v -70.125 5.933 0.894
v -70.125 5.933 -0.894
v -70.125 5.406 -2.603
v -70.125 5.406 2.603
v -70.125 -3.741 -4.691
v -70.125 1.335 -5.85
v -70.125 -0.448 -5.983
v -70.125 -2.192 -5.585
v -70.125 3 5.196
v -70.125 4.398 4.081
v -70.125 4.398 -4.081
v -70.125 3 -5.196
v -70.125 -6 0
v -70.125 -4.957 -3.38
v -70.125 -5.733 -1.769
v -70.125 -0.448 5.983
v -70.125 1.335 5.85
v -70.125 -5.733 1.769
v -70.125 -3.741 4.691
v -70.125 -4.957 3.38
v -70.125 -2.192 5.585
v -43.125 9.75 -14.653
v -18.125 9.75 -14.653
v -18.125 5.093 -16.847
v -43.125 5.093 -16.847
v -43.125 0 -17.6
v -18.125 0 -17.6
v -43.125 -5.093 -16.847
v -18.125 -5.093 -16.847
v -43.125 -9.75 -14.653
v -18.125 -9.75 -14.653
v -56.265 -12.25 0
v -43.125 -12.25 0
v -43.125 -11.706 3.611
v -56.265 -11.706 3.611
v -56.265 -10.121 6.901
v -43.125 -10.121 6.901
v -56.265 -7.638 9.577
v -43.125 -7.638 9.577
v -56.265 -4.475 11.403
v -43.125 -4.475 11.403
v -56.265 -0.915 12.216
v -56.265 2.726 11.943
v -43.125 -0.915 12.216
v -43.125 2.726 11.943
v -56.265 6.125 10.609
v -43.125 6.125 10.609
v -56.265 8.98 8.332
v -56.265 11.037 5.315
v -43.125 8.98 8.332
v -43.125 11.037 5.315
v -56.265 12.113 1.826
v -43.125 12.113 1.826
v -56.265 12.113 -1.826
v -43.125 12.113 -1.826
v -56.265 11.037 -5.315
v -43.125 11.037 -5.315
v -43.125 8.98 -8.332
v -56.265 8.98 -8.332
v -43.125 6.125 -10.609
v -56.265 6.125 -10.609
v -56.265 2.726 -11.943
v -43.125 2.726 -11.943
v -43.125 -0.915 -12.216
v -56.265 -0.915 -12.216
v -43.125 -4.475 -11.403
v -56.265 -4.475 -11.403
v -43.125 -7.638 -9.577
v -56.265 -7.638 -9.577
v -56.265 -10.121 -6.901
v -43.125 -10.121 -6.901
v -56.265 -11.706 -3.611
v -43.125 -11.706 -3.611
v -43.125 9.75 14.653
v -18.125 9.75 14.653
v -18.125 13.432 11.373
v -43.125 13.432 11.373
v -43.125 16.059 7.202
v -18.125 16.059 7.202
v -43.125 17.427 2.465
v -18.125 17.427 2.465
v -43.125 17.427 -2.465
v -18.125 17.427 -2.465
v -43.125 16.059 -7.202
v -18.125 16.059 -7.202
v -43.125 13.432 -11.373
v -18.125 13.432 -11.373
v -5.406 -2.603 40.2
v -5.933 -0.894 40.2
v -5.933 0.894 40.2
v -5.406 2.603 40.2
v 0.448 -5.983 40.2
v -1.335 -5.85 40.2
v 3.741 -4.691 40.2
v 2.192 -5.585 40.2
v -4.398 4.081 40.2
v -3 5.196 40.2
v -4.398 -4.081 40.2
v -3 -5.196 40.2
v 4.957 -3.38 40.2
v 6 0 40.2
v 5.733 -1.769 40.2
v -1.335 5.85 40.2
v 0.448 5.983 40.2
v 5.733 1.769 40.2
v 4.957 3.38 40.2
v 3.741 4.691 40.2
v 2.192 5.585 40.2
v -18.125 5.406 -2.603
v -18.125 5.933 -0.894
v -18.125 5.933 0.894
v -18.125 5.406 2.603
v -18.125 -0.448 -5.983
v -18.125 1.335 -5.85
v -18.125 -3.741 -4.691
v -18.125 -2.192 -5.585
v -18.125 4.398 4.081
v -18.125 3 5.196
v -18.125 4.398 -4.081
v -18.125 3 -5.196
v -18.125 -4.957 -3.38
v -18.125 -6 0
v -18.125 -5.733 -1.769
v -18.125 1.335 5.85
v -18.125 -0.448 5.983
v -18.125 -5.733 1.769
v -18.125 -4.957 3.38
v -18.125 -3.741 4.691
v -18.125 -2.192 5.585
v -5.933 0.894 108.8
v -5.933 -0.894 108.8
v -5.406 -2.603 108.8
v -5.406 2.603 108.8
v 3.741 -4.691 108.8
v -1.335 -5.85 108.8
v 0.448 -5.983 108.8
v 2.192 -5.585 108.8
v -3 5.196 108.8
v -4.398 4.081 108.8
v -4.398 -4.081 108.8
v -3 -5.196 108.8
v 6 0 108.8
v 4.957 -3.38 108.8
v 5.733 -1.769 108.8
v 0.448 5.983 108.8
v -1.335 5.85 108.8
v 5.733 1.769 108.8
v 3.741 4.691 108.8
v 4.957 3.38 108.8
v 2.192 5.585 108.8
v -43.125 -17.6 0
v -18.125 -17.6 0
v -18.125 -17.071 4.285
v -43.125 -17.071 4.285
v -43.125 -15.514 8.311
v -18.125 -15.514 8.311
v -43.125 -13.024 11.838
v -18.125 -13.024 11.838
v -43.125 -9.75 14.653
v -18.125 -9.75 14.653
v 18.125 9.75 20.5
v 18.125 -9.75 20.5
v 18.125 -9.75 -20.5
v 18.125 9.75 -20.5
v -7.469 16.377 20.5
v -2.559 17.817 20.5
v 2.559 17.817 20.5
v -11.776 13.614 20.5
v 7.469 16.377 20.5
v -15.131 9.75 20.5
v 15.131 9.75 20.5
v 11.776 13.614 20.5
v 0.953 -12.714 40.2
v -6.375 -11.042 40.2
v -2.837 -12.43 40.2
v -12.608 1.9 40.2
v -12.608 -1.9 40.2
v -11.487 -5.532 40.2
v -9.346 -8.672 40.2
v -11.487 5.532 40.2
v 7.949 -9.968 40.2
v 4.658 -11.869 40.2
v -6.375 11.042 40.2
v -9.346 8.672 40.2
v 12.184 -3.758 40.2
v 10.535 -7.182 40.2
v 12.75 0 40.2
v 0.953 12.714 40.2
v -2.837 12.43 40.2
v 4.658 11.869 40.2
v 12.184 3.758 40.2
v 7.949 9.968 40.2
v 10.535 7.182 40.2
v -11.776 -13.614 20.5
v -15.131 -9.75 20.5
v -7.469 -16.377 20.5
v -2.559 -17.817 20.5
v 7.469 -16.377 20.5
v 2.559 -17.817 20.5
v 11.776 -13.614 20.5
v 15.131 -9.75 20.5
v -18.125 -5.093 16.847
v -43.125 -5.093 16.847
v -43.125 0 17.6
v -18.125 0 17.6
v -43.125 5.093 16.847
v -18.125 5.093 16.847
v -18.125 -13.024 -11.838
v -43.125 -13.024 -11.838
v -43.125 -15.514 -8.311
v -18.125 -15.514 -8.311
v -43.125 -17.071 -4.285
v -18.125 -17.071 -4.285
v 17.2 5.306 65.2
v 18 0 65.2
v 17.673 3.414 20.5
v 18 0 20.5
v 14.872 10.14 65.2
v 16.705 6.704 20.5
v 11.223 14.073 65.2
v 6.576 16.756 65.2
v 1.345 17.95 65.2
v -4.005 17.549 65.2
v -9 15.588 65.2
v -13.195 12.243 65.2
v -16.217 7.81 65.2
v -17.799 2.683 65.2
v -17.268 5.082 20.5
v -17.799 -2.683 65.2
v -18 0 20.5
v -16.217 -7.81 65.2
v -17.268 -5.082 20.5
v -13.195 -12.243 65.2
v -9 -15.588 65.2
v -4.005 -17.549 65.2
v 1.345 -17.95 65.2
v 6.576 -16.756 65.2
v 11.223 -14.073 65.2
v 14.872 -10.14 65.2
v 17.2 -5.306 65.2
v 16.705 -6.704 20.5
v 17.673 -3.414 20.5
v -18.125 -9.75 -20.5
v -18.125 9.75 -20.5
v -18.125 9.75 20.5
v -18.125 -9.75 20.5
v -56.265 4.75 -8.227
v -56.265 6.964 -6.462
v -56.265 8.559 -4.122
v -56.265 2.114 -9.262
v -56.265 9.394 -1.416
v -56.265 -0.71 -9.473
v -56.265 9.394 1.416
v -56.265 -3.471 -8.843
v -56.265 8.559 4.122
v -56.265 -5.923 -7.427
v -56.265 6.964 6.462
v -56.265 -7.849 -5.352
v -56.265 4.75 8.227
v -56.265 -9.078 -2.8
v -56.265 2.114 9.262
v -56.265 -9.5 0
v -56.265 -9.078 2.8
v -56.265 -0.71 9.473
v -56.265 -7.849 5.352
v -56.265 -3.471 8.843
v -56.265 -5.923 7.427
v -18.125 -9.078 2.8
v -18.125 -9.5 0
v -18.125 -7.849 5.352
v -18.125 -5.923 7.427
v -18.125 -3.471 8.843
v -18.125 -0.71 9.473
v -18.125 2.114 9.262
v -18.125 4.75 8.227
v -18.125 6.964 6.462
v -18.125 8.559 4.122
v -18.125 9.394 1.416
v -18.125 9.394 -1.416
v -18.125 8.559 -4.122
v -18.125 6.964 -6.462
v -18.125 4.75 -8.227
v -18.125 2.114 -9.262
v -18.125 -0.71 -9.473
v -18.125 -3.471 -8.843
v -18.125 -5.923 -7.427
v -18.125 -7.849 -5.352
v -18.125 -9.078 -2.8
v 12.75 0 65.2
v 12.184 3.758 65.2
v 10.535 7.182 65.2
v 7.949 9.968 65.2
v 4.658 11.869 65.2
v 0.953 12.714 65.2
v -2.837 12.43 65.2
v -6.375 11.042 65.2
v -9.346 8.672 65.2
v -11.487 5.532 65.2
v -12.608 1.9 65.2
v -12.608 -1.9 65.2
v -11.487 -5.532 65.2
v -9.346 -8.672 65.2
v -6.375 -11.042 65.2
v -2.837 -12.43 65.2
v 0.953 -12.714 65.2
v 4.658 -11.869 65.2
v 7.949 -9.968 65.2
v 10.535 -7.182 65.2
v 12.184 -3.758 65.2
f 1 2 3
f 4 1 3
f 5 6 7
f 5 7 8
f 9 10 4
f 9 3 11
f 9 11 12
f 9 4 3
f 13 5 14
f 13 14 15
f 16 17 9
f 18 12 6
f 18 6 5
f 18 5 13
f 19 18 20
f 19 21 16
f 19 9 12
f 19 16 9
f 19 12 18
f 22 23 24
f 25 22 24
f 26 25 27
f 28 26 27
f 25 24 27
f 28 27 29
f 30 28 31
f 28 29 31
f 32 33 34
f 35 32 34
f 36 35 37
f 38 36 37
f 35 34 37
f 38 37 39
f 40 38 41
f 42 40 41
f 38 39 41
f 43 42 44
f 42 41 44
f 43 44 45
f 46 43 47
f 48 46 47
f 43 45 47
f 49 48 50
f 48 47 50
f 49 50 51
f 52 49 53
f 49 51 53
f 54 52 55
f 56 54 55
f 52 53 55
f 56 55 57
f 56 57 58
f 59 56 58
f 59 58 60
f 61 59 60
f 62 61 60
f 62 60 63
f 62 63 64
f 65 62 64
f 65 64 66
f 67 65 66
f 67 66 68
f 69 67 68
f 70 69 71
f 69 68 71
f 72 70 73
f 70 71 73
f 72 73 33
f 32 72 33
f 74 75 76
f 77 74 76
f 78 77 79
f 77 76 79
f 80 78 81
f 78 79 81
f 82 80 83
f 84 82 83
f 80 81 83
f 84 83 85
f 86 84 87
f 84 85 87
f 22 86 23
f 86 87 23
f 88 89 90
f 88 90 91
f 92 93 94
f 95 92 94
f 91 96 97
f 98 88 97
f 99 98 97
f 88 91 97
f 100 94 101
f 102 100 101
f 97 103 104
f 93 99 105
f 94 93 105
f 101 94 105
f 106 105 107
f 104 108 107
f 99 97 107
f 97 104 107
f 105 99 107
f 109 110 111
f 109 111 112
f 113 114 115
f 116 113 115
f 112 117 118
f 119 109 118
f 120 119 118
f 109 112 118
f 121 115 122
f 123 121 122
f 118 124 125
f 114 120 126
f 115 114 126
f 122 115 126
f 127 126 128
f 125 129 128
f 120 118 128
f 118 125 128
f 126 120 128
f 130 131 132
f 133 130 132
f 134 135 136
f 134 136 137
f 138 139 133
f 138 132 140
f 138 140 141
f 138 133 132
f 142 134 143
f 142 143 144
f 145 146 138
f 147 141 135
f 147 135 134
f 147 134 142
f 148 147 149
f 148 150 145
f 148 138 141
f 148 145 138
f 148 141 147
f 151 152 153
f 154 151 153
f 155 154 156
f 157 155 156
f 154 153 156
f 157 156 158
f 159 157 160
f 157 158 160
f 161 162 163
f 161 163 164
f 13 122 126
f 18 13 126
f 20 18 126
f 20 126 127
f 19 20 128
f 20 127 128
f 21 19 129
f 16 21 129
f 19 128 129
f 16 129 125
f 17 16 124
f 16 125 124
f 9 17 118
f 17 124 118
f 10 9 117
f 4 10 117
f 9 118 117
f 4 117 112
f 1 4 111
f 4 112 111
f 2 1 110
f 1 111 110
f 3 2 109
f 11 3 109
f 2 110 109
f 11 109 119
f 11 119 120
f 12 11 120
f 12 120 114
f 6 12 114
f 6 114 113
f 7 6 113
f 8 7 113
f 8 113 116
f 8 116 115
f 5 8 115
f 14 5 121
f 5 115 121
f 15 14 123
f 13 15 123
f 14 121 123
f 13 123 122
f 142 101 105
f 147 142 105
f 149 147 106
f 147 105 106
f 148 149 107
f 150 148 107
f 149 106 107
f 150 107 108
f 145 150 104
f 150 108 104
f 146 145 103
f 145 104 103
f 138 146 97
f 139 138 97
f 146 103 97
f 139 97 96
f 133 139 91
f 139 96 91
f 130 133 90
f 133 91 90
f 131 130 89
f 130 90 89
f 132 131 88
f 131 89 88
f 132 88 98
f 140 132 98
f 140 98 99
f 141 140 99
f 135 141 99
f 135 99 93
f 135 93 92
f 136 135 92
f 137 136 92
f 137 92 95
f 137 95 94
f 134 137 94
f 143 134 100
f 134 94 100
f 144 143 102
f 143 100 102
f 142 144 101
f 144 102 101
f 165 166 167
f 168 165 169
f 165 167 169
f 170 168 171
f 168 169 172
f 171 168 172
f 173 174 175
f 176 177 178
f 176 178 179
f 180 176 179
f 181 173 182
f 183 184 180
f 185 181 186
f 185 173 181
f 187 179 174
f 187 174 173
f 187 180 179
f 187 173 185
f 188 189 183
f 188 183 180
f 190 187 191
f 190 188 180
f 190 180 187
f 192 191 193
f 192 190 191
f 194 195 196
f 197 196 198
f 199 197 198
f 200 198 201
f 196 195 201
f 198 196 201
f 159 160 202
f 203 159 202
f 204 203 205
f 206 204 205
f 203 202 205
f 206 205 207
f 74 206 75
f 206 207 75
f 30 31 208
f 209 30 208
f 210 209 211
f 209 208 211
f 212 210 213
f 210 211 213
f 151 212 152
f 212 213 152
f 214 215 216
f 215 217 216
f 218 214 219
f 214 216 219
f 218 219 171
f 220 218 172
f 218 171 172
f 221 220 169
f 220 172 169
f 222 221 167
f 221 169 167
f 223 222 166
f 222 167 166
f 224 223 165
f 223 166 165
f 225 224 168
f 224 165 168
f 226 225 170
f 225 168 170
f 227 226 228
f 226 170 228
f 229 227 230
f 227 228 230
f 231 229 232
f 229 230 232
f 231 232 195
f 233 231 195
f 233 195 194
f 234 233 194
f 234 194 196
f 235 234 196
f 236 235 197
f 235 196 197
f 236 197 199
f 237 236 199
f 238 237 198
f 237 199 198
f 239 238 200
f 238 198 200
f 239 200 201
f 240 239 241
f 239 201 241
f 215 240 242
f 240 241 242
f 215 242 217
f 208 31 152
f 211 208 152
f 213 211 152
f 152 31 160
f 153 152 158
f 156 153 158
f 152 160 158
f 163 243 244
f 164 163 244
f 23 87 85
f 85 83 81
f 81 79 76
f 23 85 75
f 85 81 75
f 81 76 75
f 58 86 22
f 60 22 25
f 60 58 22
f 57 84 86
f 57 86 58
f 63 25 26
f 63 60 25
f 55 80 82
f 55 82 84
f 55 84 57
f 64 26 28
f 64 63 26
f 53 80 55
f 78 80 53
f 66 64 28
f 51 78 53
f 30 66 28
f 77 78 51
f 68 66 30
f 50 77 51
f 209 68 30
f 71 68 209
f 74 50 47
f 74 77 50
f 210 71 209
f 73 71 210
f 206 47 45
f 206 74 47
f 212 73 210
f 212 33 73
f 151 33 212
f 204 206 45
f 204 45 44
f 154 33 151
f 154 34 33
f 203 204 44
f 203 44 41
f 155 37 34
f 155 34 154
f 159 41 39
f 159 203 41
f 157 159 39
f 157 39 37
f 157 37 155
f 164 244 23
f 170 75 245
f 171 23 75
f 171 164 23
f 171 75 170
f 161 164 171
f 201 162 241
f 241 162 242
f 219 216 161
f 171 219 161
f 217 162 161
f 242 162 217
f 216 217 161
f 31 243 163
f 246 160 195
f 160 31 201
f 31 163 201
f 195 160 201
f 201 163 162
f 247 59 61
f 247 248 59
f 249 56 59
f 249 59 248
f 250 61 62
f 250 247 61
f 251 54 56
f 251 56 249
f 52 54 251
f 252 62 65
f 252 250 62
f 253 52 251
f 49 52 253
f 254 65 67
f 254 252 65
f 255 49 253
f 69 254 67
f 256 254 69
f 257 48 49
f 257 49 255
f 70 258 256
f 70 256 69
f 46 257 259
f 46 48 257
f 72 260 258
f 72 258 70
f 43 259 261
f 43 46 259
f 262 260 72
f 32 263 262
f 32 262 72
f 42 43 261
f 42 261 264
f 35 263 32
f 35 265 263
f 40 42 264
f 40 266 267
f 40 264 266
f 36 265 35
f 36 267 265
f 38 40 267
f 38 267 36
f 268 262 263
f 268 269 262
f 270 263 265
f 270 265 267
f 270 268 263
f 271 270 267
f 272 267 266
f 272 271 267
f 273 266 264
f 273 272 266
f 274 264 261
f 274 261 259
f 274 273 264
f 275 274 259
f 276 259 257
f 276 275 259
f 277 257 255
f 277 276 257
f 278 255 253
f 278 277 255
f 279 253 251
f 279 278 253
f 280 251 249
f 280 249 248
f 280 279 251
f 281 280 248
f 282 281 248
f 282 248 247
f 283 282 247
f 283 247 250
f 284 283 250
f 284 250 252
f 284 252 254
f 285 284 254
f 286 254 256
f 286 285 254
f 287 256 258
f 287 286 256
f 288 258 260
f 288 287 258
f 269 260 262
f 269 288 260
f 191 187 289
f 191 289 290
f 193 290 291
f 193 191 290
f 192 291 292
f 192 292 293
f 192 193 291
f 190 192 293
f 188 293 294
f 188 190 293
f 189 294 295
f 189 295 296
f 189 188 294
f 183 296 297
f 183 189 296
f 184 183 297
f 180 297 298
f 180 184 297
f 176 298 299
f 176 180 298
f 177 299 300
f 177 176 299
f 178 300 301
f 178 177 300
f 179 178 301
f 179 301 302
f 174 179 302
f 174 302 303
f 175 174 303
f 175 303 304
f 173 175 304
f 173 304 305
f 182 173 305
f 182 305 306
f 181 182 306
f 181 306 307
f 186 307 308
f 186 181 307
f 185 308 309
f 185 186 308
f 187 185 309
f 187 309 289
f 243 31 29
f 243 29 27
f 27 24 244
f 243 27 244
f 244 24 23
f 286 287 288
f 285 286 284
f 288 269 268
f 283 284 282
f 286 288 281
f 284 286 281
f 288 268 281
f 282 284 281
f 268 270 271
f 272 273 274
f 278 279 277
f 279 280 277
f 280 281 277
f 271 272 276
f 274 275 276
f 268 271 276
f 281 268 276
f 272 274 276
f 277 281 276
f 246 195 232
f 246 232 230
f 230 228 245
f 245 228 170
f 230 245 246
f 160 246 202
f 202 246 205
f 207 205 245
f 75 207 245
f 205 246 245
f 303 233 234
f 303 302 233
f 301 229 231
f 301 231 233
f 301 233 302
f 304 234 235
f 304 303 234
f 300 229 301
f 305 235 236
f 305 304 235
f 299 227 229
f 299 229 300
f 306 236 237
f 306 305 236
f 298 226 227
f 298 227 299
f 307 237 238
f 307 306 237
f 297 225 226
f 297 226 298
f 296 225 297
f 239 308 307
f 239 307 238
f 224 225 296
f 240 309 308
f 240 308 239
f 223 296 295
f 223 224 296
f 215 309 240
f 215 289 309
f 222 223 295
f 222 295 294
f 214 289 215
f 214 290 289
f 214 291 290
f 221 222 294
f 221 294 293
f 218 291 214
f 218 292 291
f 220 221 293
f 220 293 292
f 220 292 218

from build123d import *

# Parameters (mm, degrees)
F0_W      = 19.5
F0_H      = 41
F1_DEPTH  = 18.125
F2_R      = 18
F3_DEPTH  = 19.7
F4_R      = 18
F4_R_2    = 12.75
F5_DEPTH  = 25
F4_R_3    = 6
F6_DEPTH  = 68.6
F7_R      = 9.5
F8_DEPTH  = 25
F9_R      = 12.25
F9_R_2    = 9.5
F10_DEPTH = 13.14
F7_R_2    = 6
F11_DEPTH = 52


with BuildPart() as f1:
    # F0 (on Right) → F1 (new body, symmetric)
    with BuildSketch(Plane.YZ):
        Rectangle(F0_W, F0_H)
    extrude(amount=F1_DEPTH, both=True)

    # F2 (on face) → F3 (join)
    with BuildSketch(Plane.XY.offset(20.5)):
        Circle(F2_R)
    extrude(amount=F3_DEPTH)

    # F4 (on face) → F5 (join)
    with BuildSketch(Plane.XY.offset(40.2)):
        Circle(F4_R)
        Circle(F4_R_2, mode=Mode.SUBTRACT)
    extrude(amount=F5_DEPTH)

    # F7 (on face) → F8 (join)
    with BuildSketch(Plane(origin=(-18.125, 0, 0), x_dir=(0, -1, 0), z_dir=(-1, 0, 0))):
        with BuildLine():
            Line((-9.75, -14.65256), (-9.75, 14.65256))
            ThreePointArc((-9.75, 14.65256), (-17.6, 0), (-9.75, -14.65256))
        make_face()
        with BuildLine():
            ThreePointArc((9.75, -14.65256), (15.513865, -8.311438), (17.6, 0))
            ThreePointArc((17.6, 0), (15.513865, 8.311438), (9.75, 14.65256))
            Line((9.75, 14.65256), (9.75, -14.65256))
        make_face()
        with BuildLine():
            Line((9.75, -14.65256), (9.75, 14.65256))
            ThreePointArc((9.75, 14.65256), (0, 17.6), (-9.75, 14.65256))
            Line((-9.75, 14.65256), (-9.75, -14.65256))
            ThreePointArc((-9.75, -14.65256), (0, -17.6), (9.75, -14.65256))
        make_face()
        Circle(F7_R, mode=Mode.SUBTRACT)
    extrude(amount=F8_DEPTH)

    # F9 (on face) → F10 (join)
    with BuildSketch(Plane(origin=(-43.125, 0, 0), x_dir=(0, -1, 0), z_dir=(-1, 0, 0))):
        Circle(F9_R)
        Circle(F9_R_2, mode=Mode.SUBTRACT)
    extrude(amount=F10_DEPTH)


with BuildPart() as f6:
    # F4 (on face) → F6 (new body)
    with BuildSketch(Plane.XY.offset(40.2)):
        Circle(F4_R_3)
    extrude(amount=F6_DEPTH)


with BuildPart() as f11:
    # F7 (on face) → F11 (new body)
    with BuildSketch(Plane(origin=(-18.125, 0, 0), x_dir=(0, -1, 0), z_dir=(-1, 0, 0))):
        Circle(F7_R_2)
    extrude(amount=F11_DEPTH)


solid = Compound([f1.part, f6.part, f11.part])
